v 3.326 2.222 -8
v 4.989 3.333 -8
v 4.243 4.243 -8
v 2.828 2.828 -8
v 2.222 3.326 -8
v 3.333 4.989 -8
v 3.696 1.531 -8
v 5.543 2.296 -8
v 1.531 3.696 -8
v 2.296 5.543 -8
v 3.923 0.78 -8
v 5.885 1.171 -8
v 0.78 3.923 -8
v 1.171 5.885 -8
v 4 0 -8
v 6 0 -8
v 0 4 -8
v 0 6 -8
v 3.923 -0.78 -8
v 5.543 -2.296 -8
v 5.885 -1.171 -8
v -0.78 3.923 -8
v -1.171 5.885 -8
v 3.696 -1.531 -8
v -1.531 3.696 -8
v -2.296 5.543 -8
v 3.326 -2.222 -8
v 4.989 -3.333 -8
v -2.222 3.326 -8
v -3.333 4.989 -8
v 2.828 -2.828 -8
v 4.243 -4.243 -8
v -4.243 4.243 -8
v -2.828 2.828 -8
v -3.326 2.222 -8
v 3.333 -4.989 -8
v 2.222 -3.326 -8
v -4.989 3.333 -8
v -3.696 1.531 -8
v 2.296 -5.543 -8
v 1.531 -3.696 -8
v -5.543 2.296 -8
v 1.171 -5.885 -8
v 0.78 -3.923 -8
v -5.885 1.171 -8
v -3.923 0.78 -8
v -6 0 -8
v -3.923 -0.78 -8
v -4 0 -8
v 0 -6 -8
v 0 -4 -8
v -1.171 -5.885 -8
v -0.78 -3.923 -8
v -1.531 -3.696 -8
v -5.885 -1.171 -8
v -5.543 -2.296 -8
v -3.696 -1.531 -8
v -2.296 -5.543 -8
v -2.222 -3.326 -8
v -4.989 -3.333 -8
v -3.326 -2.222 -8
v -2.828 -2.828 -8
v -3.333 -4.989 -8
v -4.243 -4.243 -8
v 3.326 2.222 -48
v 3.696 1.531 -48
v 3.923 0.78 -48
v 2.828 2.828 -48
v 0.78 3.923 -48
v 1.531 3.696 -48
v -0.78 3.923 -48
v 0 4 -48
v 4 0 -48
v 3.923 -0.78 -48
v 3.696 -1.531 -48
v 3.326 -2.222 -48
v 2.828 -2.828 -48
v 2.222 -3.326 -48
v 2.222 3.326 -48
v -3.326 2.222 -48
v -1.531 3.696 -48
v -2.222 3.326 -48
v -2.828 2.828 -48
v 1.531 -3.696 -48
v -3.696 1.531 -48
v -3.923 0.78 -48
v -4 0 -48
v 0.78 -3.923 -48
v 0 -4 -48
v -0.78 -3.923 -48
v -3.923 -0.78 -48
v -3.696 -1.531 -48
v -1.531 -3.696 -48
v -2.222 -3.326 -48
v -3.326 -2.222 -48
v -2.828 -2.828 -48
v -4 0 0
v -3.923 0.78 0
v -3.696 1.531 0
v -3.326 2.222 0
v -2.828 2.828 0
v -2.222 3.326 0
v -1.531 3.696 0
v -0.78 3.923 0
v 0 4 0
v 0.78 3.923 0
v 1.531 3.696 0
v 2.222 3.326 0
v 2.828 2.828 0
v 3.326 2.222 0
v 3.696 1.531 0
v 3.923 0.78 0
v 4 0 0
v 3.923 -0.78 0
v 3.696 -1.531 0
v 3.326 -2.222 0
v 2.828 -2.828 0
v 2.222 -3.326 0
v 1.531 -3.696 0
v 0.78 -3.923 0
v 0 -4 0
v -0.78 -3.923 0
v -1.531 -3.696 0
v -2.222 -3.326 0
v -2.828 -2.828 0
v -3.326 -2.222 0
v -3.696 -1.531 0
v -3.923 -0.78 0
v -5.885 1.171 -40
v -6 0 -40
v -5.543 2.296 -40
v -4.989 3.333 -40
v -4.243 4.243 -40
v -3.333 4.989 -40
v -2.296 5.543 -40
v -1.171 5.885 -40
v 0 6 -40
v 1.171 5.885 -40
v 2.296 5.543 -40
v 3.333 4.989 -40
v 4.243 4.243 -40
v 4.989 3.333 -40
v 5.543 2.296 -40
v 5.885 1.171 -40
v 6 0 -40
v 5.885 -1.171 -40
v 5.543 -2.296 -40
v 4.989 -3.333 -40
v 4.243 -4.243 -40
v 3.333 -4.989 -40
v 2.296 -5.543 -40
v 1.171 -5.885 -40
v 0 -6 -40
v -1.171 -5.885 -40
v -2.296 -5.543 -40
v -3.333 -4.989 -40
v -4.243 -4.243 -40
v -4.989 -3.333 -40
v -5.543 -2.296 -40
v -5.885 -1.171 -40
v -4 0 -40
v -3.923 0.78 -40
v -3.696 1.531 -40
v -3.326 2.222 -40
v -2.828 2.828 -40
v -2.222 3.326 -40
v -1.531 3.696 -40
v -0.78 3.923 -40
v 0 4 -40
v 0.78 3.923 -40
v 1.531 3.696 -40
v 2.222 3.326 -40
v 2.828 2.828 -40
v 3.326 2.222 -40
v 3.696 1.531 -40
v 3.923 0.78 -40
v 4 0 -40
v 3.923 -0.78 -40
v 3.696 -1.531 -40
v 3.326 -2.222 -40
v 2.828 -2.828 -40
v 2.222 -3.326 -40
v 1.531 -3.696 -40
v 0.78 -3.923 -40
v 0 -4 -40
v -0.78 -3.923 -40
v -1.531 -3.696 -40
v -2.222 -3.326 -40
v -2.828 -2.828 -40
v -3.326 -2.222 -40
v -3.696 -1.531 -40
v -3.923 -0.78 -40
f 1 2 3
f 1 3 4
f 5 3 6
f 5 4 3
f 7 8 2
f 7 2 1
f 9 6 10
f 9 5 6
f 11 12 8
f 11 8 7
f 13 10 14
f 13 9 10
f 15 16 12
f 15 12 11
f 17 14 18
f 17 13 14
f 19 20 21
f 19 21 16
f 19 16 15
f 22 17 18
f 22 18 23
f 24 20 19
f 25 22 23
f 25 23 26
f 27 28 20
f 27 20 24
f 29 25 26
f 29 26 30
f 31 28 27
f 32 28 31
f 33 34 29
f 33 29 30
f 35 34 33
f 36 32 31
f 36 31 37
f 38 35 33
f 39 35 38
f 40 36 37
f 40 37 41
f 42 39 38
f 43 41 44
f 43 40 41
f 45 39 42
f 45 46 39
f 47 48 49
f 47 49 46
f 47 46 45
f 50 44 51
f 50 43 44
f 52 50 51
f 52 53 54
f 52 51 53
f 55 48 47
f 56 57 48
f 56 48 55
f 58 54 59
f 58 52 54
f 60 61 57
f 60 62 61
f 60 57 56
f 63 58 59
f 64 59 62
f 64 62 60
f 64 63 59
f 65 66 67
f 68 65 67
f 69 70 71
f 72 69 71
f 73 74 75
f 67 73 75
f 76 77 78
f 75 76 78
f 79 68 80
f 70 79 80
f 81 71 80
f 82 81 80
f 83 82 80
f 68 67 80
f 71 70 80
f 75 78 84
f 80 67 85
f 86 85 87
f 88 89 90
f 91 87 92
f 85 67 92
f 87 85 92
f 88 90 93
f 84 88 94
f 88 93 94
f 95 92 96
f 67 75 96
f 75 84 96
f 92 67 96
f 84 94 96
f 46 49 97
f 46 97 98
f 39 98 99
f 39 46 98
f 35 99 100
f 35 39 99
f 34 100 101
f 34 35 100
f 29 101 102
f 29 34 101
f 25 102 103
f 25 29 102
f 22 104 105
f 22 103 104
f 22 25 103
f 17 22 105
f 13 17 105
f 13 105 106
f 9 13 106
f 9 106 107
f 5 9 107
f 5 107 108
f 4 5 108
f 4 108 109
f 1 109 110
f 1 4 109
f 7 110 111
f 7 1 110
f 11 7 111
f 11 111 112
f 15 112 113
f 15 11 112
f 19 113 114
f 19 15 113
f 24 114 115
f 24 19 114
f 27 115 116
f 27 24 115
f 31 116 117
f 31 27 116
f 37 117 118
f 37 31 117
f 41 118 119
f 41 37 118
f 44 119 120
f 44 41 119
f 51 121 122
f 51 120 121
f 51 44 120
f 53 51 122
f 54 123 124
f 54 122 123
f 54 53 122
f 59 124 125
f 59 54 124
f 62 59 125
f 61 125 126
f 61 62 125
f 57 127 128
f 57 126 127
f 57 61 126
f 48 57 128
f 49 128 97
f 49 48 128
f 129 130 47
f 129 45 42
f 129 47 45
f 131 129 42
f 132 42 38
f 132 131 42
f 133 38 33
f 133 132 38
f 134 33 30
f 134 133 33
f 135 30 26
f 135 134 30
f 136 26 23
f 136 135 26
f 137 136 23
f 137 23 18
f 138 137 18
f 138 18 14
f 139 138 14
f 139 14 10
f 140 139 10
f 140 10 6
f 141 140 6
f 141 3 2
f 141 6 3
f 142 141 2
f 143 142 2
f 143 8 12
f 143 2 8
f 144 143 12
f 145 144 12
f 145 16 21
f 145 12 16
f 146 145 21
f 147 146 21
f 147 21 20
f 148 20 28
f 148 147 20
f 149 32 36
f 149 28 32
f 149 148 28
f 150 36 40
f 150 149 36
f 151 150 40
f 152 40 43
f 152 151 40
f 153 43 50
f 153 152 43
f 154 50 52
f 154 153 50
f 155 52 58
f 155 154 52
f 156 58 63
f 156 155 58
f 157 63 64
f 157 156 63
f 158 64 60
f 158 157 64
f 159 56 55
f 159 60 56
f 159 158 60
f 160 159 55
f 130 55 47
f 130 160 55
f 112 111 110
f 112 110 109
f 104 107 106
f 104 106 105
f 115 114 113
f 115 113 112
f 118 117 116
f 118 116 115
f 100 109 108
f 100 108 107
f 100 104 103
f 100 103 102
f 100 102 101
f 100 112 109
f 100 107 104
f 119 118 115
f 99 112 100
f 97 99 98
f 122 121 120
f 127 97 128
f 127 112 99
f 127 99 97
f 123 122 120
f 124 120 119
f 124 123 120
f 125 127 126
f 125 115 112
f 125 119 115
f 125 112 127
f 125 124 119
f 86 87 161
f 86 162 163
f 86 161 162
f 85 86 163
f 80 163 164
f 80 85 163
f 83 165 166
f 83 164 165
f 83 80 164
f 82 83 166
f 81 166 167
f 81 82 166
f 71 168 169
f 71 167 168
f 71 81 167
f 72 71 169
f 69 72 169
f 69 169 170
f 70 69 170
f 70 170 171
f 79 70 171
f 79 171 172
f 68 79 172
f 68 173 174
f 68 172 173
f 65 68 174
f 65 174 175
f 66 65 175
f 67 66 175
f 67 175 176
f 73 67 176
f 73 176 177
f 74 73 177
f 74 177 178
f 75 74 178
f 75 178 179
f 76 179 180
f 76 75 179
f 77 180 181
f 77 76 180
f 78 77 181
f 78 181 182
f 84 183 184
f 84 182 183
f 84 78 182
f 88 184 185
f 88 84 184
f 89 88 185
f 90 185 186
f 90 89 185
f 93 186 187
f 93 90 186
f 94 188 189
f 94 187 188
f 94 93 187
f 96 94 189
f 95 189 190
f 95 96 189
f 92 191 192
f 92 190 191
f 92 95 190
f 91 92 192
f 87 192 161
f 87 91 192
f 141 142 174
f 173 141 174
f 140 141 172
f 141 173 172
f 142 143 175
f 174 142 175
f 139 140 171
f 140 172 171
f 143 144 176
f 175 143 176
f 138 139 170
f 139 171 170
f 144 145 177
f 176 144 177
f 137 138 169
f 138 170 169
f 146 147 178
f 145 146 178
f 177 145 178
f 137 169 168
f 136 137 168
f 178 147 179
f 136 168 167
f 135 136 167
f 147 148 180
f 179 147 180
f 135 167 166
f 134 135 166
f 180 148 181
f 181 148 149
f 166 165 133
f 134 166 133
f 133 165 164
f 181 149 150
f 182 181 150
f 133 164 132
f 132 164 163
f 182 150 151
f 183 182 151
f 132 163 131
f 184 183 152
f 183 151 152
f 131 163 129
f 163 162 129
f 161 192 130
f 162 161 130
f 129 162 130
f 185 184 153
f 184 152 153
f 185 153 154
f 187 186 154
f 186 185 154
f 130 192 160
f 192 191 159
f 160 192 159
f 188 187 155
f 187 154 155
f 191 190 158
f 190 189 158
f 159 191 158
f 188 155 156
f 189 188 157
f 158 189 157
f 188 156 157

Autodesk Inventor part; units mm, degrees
ref_plane "YZ Plane" through (0, 0, 0) normal (1, 0, 0) x (0, 1, 0)
ref_plane "XZ Plane" through (0, 0, 0) normal (0, 1, 0) x (-1, 0, 0)
ref_plane "XY Plane" through (0, 0, 0) normal (0, 0, 1) x (1, 0, 0)
sketch "Skizze1" plane through (0, 0, 0) normal (0, 1, 0) x (-1, 0, 0)
  line L0 (0, 0) -> (4, 0)
  line L1 (4, 0) -> (4, -8)
  line L2 (4, -8) -> (6, -8)
  line L3 (6, -8) -> (6, -40)
  line L4 (6, -40) -> (4, -40)
  line L5 (4, -40) -> (4, -48)
  line L6 (4, -48) -> (0, -48)
  line L7 (0, -48) -> (0, 0)
  dimension "d0" = 8
  dimension "d1" = 32
  dimension "d2" = 8
  dimension "d3" = 8
  dimension "d4" = 12
revolve "Umdrehung1" add sketch "Skizze1" angle 360 about axis through (0, 0, -48) along (0, 0, 1)
thread "Gewinde1" size "M8x1.25" class "6g" standard "ISO Metric profile" full length
equation "\"d2\" = d0"
properties part number "17"
